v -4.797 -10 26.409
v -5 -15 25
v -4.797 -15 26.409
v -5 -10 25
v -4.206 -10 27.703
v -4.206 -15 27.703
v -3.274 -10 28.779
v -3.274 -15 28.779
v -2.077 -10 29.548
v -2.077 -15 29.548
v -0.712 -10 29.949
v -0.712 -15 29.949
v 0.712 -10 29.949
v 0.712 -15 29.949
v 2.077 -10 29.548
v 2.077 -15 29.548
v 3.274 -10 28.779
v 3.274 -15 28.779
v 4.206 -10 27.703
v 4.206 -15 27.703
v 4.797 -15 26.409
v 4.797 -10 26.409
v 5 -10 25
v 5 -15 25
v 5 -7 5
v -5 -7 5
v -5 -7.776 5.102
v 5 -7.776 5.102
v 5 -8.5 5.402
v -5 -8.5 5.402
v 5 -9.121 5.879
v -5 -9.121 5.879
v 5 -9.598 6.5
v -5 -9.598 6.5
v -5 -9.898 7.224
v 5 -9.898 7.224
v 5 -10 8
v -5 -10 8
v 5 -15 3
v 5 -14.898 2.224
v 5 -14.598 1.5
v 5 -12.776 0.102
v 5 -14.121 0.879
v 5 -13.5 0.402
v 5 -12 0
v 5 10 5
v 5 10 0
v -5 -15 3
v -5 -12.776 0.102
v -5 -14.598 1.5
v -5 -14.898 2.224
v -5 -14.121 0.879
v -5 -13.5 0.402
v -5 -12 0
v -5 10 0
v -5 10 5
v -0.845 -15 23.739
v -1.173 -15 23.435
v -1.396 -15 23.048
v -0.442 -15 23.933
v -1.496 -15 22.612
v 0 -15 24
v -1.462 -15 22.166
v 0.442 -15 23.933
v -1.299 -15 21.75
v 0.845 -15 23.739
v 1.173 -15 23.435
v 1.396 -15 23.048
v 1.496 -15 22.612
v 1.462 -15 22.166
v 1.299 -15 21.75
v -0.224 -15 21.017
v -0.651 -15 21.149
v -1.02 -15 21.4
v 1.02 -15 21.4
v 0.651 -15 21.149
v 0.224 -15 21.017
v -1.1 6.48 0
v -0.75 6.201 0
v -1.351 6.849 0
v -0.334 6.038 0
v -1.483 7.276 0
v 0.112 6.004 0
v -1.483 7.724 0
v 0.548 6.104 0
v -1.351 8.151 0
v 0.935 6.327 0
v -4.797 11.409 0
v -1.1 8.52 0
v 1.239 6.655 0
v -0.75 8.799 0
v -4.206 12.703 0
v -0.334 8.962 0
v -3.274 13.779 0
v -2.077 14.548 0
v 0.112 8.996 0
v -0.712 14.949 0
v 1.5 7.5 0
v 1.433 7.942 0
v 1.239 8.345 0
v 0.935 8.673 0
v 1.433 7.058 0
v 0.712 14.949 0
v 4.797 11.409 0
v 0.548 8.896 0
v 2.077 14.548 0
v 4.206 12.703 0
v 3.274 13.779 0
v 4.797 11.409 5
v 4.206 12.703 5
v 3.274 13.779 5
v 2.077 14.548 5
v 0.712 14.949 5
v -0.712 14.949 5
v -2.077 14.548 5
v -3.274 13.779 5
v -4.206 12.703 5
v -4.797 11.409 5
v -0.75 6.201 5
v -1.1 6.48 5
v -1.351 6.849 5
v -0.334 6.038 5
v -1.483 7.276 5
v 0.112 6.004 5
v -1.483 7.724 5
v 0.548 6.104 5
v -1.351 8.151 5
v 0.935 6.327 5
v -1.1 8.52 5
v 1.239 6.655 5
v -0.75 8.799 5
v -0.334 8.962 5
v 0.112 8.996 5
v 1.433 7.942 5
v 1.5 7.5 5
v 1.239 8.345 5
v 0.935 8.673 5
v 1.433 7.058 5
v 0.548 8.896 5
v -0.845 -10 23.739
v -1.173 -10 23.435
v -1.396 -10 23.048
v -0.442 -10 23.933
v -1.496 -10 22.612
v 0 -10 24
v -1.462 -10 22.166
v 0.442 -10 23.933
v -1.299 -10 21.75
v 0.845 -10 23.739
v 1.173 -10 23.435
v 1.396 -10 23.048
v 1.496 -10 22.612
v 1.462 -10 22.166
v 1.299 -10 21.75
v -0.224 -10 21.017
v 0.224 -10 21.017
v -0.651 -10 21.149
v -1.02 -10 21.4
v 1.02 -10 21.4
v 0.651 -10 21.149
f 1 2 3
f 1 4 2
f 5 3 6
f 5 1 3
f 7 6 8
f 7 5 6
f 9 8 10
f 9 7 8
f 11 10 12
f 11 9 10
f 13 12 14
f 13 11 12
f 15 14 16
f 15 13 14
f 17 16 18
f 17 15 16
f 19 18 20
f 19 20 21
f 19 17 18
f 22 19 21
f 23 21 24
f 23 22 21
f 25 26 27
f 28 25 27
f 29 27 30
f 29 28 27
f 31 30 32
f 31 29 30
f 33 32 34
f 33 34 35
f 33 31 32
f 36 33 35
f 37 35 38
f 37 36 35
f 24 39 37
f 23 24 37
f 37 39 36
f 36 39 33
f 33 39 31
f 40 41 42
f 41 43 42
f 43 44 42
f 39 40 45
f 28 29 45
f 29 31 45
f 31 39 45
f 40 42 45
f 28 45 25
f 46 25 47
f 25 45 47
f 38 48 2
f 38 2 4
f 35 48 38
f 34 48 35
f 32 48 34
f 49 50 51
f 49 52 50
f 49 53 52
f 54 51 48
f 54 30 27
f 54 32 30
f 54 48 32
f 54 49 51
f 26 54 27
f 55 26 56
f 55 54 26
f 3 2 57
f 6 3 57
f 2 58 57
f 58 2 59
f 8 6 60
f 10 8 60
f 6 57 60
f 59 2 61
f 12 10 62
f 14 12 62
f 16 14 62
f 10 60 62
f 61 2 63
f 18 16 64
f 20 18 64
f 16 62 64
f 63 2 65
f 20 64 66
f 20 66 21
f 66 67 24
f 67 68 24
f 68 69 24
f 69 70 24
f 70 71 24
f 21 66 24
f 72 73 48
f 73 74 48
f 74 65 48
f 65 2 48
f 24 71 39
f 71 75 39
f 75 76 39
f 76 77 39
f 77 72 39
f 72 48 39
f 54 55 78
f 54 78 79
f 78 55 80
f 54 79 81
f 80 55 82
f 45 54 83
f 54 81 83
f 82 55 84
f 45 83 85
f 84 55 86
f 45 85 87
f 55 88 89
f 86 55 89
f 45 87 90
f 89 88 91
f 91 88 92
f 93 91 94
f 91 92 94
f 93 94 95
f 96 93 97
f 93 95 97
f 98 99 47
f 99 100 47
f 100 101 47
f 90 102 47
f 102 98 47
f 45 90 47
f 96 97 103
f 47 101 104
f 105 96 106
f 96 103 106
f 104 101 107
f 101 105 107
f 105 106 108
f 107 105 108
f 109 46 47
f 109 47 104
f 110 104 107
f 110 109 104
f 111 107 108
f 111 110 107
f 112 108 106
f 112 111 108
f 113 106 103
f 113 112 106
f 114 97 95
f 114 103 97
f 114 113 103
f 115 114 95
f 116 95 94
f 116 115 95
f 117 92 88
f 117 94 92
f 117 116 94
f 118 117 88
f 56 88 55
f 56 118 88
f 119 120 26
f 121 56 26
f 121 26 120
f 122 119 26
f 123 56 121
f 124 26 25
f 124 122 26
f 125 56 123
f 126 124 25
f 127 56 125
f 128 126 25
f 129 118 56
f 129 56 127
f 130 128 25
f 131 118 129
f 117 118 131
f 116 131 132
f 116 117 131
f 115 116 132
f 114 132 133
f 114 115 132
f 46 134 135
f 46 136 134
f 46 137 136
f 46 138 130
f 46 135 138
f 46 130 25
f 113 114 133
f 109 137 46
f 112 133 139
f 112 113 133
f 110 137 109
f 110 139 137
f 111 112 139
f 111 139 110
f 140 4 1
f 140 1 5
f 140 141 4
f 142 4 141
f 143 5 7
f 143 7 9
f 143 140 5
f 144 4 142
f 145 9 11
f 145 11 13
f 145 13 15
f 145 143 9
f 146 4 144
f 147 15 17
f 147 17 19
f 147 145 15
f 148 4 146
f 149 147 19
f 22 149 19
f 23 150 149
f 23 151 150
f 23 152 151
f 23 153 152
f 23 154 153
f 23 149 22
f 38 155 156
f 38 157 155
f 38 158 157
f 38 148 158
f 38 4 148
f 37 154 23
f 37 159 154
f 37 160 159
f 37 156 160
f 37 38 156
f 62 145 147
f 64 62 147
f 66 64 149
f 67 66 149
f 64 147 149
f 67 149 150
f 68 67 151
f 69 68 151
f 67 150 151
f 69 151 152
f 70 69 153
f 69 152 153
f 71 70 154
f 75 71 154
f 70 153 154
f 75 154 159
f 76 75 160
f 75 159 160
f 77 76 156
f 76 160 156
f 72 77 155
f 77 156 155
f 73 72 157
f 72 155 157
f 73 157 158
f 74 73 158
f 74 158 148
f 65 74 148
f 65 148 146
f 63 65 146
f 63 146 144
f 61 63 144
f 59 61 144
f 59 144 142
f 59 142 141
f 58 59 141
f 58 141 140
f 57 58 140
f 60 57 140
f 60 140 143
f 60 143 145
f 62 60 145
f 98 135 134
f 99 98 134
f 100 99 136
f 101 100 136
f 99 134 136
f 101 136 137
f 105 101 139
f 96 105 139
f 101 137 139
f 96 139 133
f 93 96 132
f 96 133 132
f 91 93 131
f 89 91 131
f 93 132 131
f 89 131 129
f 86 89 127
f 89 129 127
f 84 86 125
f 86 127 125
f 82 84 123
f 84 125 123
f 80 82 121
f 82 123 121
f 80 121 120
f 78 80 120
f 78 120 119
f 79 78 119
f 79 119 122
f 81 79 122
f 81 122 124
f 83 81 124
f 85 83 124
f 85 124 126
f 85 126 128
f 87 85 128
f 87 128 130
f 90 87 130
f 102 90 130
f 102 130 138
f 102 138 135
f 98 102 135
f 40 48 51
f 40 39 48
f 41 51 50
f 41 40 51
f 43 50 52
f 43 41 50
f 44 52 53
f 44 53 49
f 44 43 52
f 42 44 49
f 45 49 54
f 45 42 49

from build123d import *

# Parameters (mm, degrees)
ESQUISSE1_W             = 10
ESQUISSE1_H             = 30
BOSS_EXTRU_1_DEPTH      = 5
ESQUISSE2_W             = 10
ESQUISSE2_H             = 5
BOSS_EXTRU_2_DEPTH      = 25
ESQUISSE3_R             = 1.5
ENL_V_MAT_EXTRU_1_DEPTH = 30
ESQUISSE4_R             = 1.5
ENL_V_MAT_EXTRU_2_DEPTH = 30
CONG_1_RADIUS           = 5
CONG_1_LENGTH           = 5
CONG_2_RADIUS           = 5
CONG_2_LENGTH           = 5
CONG_3_R                = 3
CONG_4_R                = 3


with BuildPart() as part:
    # Esquisse1 → Boss.-Extru.1 (new body)
    with BuildSketch(Plane.XY):
        Rectangle(ESQUISSE1_W, ESQUISSE1_H)
    extrude(amount=BOSS_EXTRU_1_DEPTH)

    # Esquisse2 → Boss.-Extru.2 (add)
    with BuildSketch(Plane.XY.offset(5)):
        with Locations((0, -12.5)):
            Rectangle(ESQUISSE2_W, ESQUISSE2_H)
    extrude(amount=BOSS_EXTRU_2_DEPTH)

    # Esquisse3 → Enlèv. mat.-Extru.1 (cut)
    with BuildSketch(Plane.XY.offset(5)):
        with Locations((0, 7.5)):
            Circle(ESQUISSE3_R)
    extrude(amount=-ENL_V_MAT_EXTRU_1_DEPTH, mode=Mode.SUBTRACT)

    # Esquisse4 → Enlèv. mat.-Extru.2 (cut)
    with BuildSketch(Plane(origin=(0, -10, 0), x_dir=(1, 0, 0), z_dir=(0, 1, 0))):
        with Locations(Location((0, -22.5, 0), (0, 0, 270))):
            Circle(ESQUISSE4_R)
    extrude(amount=-ENL_V_MAT_EXTRU_2_DEPTH, mode=Mode.SUBTRACT)

    # Congé1: full round fillet: the end face becomes a half cylinder, R = half its width
    cong_1_face = Plane((0, 15, 2.5), x_dir=(0, 0, 1), z_dir=(0, 1, 0))  # on the end face: x along it, z out of the body
    cong_1_slab = cong_1_face.offset(-CONG_1_RADIUS / 2) * Box(CONG_1_LENGTH, 2 * CONG_1_RADIUS, CONG_1_RADIUS, mode=Mode.PRIVATE)  # the body's end, R deep
    cong_1_round = Plane((0, 10, 2.5), x_dir=(0, 1, 0), z_dir=(0, 0, 1)) * Cylinder(CONG_1_RADIUS, CONG_1_LENGTH, mode=Mode.PRIVATE)  # its axis R under the face
    add(cong_1_slab - cong_1_round, mode=Mode.SUBTRACT)

    # Congé2: full round fillet: the end face becomes a half cylinder, R = half its width
    cong_2_face = Plane((0, -12.5, 30), x_dir=(0, 1, 0), z_dir=(0, 0, 1))  # on the end face: x along it, z out of the body
    cong_2_slab = cong_2_face.offset(-CONG_2_RADIUS / 2) * Box(CONG_2_LENGTH, 2 * CONG_2_RADIUS, CONG_2_RADIUS, mode=Mode.PRIVATE)  # the body's end, R deep
    cong_2_round = Plane((0, -12.5, 25), x_dir=(0, 0, 1), z_dir=(0, 1, 0)) * Cylinder(CONG_2_RADIUS, CONG_2_LENGTH, mode=Mode.PRIVATE)  # its axis R under the face
    add(cong_2_slab - cong_2_round, mode=Mode.SUBTRACT)

    # Congé3
    cong_3_edges = [part.edges().sort_by_distance(p)[0] for p in [
        (0, -15, 0),
    ]]
    fillet(cong_3_edges, radius=CONG_3_R)

    # Congé4
    cong_4_edges = [part.edges().sort_by_distance(p)[0] for p in [
        (0, -10, 5),
    ]]
    fillet(cong_4_edges, radius=CONG_4_R)


solid = part.part
